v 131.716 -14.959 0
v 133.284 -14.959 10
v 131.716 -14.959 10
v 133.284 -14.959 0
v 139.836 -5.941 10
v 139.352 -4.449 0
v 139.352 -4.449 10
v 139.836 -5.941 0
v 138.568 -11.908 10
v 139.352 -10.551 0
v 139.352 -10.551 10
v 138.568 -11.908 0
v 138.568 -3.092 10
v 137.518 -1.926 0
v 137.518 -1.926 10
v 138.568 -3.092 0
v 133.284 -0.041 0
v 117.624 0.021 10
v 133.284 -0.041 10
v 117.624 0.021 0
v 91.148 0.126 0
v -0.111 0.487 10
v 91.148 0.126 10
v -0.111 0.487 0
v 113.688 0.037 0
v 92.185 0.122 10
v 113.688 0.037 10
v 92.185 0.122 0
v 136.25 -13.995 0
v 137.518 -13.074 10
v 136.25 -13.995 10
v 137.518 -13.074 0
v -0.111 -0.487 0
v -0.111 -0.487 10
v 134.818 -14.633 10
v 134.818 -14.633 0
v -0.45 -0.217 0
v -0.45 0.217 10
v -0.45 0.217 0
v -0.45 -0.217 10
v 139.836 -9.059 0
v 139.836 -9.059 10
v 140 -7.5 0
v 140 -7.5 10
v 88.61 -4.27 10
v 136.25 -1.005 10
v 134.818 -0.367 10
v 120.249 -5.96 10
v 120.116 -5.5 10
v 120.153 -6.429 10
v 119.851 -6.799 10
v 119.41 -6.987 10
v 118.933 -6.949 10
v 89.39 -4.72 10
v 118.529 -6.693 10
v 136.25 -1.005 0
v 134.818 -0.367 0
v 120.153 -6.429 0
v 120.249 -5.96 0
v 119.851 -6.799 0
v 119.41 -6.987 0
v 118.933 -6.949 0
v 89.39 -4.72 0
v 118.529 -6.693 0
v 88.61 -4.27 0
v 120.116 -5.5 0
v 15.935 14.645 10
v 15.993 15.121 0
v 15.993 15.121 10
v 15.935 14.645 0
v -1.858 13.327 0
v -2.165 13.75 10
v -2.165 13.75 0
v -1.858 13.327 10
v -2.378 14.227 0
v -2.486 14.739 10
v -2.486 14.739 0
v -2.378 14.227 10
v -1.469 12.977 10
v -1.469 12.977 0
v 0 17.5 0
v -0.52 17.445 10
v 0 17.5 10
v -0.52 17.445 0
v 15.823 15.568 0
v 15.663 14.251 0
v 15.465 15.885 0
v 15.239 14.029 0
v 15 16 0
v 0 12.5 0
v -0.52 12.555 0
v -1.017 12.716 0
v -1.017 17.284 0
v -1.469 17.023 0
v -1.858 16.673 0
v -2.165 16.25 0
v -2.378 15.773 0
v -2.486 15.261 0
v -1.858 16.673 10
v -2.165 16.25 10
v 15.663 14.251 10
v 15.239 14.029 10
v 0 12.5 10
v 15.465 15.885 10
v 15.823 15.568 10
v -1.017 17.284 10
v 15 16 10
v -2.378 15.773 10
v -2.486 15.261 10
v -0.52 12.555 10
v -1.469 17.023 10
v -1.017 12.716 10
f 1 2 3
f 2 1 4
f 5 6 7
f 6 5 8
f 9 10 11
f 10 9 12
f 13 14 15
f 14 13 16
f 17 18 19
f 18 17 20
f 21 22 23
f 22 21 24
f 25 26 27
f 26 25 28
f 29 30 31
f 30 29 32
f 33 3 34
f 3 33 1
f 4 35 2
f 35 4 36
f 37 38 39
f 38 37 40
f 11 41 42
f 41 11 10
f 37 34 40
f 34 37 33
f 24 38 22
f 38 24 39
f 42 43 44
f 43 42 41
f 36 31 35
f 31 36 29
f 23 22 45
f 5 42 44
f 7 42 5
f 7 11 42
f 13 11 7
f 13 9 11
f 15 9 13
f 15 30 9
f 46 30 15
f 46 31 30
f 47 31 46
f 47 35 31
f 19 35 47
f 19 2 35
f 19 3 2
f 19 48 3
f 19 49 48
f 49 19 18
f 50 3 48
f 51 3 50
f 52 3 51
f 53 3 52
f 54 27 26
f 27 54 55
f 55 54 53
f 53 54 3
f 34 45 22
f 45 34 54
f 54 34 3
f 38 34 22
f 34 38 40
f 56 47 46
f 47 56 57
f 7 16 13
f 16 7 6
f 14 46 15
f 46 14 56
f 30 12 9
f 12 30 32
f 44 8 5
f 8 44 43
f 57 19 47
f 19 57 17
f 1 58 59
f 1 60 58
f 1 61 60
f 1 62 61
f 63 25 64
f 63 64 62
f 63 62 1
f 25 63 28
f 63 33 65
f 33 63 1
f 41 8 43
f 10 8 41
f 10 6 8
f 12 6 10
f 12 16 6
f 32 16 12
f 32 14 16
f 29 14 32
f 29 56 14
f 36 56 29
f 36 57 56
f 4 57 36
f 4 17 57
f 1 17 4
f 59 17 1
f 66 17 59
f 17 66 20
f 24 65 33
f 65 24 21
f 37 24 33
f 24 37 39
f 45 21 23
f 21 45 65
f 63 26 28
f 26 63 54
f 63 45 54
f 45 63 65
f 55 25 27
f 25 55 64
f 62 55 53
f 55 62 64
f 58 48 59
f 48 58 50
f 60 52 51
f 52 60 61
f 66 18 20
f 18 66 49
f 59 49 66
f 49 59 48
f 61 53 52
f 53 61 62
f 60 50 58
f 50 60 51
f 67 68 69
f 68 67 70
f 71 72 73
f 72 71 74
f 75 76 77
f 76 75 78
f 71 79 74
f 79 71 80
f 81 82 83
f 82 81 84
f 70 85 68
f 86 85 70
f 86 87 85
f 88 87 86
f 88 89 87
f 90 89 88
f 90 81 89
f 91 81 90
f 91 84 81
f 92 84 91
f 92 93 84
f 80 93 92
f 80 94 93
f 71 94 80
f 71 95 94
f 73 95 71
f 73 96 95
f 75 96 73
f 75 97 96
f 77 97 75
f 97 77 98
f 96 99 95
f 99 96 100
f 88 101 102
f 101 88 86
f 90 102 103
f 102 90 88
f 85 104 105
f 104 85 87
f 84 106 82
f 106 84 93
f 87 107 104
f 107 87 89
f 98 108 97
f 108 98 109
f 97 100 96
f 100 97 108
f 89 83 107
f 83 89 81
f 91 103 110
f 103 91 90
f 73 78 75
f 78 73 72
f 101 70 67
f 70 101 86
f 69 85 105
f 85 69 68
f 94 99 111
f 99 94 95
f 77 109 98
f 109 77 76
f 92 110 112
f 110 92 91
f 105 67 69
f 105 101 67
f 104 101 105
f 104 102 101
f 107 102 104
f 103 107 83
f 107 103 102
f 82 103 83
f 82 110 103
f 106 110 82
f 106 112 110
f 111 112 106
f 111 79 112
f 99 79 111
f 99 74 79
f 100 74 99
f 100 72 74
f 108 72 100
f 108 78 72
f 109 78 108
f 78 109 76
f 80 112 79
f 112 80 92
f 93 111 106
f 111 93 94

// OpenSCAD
part = "both";  // [first:Block only,second:Wedge only,both:Block and wedge]

width = 10; // [1:1:200]
height = 15; // [10:1:100]
length = 140; // [40:1:300]
paperThickness = 0.45; // [0.05:0.05:2]

/* [HIDDEN] */
$fs=0.5;

module wedge(width)
{
	hull()
	{
		translate([0,0,-15]) rotate([90,0,0]) cylinder(h=width,d=5,center=true);
		rotate([90,0,0]) cylinder(h=width,d=2,center=true);
	}
}

module block(width,height,length,paperThickness)
{
	difference()
	{
		difference()
		{
			/* MAIN BLOCK */
			hull()
			{
				rotate([90,0,0]) cylinder(h=width,d=1,center=true);
				translate([length-height/2,0,height/2])
					rotate([90,0,0])
					cylinder(h=width,d=height,center=true);
			}
			
			/* PAPER INSERT */
			translate([(length-height/2)*0.7,0,-2])
				rotate([0,-30,0])
				cube([paperThickness*2,width*1.1,15],center=true);
		}
		
		/* WEDGE INSERT */
		translate([(length-height/2)*0.9,0,6])
			rotate([0,30,0])
			wedge(width*1.1);
	}
}

module print_part(part)
{
	if (part == "first")
	{
		translate([0,0,width/2]) rotate([90,0,0]) block(width,height,length,paperThickness);
	}
	else if (part == "second")
	{
		translate([0,0,width/2]) rotate([90,0,-90]) wedge(width);
	}
	else if (part == "both")
	{
		translate([0,0,width/2]) rotate([90,0,0]) block(width,height,length,paperThickness);
		translate([15,15,width/2]) rotate([90,0,90]) wedge(width);
	}
	else
	{
		translate([0,0,width/2]) rotate([90,0,0]) block(width,height,length,paperThickness);
		translate([15,15,width/2]) rotate([90,0,90]) wedge(width);
	}
}

print_part(part);
